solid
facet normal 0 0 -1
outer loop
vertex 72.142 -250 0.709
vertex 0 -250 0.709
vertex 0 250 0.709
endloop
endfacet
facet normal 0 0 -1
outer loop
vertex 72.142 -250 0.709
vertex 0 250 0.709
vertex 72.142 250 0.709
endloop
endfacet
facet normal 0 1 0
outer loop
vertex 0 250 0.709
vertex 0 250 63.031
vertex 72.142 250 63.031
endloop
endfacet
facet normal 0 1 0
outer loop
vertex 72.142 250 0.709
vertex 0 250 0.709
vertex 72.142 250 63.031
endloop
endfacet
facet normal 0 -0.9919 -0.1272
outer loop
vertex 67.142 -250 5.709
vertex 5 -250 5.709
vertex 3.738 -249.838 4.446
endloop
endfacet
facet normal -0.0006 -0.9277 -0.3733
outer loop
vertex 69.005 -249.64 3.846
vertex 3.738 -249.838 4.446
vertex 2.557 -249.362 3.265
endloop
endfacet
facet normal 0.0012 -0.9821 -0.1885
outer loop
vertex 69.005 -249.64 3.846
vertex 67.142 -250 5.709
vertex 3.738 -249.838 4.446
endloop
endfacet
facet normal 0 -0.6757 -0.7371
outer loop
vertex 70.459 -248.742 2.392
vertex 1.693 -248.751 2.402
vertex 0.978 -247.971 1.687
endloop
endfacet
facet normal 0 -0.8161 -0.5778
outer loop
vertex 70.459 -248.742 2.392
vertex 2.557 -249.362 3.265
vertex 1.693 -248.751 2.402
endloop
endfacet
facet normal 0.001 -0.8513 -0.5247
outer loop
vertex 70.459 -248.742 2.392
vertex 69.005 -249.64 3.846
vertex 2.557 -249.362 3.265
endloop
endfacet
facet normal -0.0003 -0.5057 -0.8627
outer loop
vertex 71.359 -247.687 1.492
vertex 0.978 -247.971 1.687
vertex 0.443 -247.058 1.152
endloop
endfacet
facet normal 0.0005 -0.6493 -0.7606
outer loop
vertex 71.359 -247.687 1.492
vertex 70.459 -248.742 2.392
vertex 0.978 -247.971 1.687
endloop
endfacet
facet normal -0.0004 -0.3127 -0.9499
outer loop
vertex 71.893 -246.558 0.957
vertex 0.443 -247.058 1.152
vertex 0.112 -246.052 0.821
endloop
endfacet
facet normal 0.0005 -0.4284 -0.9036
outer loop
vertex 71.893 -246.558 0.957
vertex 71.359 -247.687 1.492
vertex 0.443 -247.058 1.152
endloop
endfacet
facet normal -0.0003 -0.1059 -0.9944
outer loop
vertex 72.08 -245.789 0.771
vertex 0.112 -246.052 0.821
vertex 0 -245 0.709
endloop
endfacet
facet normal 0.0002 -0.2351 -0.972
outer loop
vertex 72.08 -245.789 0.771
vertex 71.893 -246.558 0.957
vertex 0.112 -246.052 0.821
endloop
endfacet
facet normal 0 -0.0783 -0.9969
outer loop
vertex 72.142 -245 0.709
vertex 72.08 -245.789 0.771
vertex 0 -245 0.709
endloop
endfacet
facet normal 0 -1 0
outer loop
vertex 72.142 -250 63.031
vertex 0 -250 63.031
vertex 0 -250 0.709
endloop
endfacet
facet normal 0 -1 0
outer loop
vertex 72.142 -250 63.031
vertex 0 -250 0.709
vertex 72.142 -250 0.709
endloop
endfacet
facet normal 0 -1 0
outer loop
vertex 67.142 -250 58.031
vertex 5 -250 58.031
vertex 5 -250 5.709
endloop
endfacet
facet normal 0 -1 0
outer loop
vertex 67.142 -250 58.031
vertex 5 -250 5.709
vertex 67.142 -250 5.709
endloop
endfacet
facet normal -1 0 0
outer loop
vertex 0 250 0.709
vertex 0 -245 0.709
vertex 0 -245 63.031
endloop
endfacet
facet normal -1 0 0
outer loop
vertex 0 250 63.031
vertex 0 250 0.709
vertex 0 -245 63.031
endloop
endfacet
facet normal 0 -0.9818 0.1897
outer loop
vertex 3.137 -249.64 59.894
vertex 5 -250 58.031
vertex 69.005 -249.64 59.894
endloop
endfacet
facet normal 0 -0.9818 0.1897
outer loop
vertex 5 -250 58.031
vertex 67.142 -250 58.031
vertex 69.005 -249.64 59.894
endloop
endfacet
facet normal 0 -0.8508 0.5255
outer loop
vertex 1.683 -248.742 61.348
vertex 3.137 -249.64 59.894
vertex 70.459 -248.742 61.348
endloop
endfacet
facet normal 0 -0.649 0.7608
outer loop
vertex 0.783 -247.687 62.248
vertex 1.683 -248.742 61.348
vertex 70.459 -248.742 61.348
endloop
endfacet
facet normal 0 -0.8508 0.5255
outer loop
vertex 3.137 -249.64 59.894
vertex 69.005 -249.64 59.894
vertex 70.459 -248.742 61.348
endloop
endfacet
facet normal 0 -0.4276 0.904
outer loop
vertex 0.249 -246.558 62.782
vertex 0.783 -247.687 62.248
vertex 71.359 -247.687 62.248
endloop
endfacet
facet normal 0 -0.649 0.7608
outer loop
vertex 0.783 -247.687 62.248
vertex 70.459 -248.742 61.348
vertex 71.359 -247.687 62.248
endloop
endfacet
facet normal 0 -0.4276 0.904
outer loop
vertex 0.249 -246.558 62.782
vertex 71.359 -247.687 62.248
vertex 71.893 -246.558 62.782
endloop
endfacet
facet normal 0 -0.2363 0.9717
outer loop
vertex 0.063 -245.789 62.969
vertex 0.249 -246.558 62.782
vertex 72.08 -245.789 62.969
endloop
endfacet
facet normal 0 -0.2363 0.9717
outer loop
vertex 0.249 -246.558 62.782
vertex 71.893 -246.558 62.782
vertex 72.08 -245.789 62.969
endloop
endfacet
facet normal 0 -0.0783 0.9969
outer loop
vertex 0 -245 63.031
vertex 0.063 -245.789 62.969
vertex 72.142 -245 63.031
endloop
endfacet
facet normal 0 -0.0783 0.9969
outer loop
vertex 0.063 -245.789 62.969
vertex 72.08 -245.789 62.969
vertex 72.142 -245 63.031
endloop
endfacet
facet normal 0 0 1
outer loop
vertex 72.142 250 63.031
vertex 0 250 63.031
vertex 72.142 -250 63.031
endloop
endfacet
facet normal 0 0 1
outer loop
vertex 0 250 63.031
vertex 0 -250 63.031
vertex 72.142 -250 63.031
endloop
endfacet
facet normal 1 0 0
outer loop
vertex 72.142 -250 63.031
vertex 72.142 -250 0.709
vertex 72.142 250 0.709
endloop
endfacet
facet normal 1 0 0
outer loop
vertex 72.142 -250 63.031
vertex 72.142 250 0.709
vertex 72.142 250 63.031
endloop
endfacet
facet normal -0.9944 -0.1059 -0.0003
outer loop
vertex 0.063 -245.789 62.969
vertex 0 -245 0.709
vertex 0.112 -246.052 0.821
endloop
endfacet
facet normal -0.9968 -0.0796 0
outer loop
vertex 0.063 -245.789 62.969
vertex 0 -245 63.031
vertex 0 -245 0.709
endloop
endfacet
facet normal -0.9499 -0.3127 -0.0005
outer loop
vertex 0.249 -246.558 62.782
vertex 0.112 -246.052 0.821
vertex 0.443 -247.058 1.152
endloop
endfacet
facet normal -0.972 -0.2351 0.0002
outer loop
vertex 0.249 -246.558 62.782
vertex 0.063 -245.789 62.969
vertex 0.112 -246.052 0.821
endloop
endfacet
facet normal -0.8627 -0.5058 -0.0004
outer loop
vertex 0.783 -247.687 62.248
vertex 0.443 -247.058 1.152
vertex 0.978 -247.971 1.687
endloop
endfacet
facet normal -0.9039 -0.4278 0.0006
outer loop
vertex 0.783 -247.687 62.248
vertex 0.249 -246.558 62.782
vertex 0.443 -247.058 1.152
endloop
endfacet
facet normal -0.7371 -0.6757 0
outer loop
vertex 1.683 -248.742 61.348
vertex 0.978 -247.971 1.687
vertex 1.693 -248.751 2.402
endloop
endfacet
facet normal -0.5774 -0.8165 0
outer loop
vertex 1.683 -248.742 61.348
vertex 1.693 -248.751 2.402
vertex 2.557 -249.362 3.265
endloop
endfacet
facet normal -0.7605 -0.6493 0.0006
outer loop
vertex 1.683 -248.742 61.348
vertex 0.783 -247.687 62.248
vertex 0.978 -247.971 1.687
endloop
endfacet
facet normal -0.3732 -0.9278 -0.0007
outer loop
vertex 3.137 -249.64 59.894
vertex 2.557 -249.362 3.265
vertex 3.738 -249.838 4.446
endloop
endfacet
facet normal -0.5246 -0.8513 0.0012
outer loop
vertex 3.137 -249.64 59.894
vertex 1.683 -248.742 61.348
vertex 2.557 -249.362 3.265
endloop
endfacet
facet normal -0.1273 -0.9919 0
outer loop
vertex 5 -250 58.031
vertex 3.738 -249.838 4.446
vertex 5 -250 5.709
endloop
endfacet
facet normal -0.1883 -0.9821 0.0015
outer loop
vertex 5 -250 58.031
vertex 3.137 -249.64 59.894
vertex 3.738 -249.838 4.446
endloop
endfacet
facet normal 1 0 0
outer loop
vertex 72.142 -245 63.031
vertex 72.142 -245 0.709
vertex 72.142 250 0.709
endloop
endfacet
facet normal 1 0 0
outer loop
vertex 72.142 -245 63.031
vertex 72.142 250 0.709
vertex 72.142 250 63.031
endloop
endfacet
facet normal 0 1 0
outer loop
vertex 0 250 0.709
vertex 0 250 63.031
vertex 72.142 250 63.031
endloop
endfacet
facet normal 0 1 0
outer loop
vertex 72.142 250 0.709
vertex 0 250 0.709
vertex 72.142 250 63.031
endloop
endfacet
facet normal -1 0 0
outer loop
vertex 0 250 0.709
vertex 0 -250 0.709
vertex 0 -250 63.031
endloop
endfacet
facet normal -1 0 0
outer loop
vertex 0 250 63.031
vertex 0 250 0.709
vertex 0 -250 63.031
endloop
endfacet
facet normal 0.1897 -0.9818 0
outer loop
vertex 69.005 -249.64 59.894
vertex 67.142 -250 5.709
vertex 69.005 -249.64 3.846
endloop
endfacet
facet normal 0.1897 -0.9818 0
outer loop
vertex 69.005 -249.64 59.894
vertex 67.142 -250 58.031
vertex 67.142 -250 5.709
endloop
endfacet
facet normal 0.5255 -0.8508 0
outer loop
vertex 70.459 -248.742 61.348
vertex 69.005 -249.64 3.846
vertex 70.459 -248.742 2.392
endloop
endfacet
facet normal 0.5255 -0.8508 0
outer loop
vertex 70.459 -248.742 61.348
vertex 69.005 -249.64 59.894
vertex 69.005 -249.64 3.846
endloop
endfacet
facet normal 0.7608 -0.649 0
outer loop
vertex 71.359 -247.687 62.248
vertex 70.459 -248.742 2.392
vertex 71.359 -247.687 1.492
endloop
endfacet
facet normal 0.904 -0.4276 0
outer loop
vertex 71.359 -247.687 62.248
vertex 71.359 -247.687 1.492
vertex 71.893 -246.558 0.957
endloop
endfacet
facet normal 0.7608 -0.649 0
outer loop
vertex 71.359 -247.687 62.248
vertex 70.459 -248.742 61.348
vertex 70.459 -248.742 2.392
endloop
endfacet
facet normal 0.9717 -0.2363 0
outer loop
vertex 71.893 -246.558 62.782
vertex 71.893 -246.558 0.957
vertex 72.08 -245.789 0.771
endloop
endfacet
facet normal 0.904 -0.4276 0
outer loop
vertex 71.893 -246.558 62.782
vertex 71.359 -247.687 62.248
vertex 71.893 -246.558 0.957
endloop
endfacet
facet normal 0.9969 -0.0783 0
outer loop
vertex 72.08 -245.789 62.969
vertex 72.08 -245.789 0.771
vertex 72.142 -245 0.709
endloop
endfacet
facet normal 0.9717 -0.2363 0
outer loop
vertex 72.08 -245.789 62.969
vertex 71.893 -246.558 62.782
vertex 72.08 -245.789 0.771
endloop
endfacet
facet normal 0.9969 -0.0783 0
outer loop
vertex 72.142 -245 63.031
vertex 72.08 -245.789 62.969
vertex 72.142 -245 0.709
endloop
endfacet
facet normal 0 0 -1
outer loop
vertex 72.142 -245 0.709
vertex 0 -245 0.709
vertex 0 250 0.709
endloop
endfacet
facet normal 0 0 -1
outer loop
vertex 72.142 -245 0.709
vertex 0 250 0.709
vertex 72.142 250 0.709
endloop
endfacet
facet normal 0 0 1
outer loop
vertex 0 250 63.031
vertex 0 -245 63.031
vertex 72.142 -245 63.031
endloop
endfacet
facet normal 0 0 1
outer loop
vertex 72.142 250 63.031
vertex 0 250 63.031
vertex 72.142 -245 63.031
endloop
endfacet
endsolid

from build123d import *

# Parameters (mm, degrees)
F0_W     = 72.1422024071
F0_H     = 62.3225895688
F2_DEPTH = 250
F1_W     = 72.1422024071
F1_H     = 62.3225895688
F3_R     = 5


with BuildPart() as f2:
    # F0 (on Front) → F2 (new body, symmetric)
    with BuildSketch(Plane.XZ):
        with Locations((36.0711012036, 31.8698310293)):
            Rectangle(F0_W, F0_H)
    extrude(amount=F2_DEPTH, both=True)

    # F3
    f3_edges = [f2.edges().sort_by_distance(p)[0] for p in [
        (72.142202, -250, 31.869831),
        (36.071101, -250, 63.031126),
        (0, -250, 31.869831),
        (36.071101, -250, 0.708536),
    ]]
    fillet(f3_edges, radius=F3_R)


with BuildPart() as f2b:
    # F1 (on face) → F2, piece 2 (new body, symmetric)
    with BuildSketch(Plane.XZ):
        with Locations((36.0711012036, 31.8698310293)):
            Rectangle(F1_W, F1_H)
    extrude(amount=F2_DEPTH, both=True)


solid = Compound([f2.part, f2b.part])
